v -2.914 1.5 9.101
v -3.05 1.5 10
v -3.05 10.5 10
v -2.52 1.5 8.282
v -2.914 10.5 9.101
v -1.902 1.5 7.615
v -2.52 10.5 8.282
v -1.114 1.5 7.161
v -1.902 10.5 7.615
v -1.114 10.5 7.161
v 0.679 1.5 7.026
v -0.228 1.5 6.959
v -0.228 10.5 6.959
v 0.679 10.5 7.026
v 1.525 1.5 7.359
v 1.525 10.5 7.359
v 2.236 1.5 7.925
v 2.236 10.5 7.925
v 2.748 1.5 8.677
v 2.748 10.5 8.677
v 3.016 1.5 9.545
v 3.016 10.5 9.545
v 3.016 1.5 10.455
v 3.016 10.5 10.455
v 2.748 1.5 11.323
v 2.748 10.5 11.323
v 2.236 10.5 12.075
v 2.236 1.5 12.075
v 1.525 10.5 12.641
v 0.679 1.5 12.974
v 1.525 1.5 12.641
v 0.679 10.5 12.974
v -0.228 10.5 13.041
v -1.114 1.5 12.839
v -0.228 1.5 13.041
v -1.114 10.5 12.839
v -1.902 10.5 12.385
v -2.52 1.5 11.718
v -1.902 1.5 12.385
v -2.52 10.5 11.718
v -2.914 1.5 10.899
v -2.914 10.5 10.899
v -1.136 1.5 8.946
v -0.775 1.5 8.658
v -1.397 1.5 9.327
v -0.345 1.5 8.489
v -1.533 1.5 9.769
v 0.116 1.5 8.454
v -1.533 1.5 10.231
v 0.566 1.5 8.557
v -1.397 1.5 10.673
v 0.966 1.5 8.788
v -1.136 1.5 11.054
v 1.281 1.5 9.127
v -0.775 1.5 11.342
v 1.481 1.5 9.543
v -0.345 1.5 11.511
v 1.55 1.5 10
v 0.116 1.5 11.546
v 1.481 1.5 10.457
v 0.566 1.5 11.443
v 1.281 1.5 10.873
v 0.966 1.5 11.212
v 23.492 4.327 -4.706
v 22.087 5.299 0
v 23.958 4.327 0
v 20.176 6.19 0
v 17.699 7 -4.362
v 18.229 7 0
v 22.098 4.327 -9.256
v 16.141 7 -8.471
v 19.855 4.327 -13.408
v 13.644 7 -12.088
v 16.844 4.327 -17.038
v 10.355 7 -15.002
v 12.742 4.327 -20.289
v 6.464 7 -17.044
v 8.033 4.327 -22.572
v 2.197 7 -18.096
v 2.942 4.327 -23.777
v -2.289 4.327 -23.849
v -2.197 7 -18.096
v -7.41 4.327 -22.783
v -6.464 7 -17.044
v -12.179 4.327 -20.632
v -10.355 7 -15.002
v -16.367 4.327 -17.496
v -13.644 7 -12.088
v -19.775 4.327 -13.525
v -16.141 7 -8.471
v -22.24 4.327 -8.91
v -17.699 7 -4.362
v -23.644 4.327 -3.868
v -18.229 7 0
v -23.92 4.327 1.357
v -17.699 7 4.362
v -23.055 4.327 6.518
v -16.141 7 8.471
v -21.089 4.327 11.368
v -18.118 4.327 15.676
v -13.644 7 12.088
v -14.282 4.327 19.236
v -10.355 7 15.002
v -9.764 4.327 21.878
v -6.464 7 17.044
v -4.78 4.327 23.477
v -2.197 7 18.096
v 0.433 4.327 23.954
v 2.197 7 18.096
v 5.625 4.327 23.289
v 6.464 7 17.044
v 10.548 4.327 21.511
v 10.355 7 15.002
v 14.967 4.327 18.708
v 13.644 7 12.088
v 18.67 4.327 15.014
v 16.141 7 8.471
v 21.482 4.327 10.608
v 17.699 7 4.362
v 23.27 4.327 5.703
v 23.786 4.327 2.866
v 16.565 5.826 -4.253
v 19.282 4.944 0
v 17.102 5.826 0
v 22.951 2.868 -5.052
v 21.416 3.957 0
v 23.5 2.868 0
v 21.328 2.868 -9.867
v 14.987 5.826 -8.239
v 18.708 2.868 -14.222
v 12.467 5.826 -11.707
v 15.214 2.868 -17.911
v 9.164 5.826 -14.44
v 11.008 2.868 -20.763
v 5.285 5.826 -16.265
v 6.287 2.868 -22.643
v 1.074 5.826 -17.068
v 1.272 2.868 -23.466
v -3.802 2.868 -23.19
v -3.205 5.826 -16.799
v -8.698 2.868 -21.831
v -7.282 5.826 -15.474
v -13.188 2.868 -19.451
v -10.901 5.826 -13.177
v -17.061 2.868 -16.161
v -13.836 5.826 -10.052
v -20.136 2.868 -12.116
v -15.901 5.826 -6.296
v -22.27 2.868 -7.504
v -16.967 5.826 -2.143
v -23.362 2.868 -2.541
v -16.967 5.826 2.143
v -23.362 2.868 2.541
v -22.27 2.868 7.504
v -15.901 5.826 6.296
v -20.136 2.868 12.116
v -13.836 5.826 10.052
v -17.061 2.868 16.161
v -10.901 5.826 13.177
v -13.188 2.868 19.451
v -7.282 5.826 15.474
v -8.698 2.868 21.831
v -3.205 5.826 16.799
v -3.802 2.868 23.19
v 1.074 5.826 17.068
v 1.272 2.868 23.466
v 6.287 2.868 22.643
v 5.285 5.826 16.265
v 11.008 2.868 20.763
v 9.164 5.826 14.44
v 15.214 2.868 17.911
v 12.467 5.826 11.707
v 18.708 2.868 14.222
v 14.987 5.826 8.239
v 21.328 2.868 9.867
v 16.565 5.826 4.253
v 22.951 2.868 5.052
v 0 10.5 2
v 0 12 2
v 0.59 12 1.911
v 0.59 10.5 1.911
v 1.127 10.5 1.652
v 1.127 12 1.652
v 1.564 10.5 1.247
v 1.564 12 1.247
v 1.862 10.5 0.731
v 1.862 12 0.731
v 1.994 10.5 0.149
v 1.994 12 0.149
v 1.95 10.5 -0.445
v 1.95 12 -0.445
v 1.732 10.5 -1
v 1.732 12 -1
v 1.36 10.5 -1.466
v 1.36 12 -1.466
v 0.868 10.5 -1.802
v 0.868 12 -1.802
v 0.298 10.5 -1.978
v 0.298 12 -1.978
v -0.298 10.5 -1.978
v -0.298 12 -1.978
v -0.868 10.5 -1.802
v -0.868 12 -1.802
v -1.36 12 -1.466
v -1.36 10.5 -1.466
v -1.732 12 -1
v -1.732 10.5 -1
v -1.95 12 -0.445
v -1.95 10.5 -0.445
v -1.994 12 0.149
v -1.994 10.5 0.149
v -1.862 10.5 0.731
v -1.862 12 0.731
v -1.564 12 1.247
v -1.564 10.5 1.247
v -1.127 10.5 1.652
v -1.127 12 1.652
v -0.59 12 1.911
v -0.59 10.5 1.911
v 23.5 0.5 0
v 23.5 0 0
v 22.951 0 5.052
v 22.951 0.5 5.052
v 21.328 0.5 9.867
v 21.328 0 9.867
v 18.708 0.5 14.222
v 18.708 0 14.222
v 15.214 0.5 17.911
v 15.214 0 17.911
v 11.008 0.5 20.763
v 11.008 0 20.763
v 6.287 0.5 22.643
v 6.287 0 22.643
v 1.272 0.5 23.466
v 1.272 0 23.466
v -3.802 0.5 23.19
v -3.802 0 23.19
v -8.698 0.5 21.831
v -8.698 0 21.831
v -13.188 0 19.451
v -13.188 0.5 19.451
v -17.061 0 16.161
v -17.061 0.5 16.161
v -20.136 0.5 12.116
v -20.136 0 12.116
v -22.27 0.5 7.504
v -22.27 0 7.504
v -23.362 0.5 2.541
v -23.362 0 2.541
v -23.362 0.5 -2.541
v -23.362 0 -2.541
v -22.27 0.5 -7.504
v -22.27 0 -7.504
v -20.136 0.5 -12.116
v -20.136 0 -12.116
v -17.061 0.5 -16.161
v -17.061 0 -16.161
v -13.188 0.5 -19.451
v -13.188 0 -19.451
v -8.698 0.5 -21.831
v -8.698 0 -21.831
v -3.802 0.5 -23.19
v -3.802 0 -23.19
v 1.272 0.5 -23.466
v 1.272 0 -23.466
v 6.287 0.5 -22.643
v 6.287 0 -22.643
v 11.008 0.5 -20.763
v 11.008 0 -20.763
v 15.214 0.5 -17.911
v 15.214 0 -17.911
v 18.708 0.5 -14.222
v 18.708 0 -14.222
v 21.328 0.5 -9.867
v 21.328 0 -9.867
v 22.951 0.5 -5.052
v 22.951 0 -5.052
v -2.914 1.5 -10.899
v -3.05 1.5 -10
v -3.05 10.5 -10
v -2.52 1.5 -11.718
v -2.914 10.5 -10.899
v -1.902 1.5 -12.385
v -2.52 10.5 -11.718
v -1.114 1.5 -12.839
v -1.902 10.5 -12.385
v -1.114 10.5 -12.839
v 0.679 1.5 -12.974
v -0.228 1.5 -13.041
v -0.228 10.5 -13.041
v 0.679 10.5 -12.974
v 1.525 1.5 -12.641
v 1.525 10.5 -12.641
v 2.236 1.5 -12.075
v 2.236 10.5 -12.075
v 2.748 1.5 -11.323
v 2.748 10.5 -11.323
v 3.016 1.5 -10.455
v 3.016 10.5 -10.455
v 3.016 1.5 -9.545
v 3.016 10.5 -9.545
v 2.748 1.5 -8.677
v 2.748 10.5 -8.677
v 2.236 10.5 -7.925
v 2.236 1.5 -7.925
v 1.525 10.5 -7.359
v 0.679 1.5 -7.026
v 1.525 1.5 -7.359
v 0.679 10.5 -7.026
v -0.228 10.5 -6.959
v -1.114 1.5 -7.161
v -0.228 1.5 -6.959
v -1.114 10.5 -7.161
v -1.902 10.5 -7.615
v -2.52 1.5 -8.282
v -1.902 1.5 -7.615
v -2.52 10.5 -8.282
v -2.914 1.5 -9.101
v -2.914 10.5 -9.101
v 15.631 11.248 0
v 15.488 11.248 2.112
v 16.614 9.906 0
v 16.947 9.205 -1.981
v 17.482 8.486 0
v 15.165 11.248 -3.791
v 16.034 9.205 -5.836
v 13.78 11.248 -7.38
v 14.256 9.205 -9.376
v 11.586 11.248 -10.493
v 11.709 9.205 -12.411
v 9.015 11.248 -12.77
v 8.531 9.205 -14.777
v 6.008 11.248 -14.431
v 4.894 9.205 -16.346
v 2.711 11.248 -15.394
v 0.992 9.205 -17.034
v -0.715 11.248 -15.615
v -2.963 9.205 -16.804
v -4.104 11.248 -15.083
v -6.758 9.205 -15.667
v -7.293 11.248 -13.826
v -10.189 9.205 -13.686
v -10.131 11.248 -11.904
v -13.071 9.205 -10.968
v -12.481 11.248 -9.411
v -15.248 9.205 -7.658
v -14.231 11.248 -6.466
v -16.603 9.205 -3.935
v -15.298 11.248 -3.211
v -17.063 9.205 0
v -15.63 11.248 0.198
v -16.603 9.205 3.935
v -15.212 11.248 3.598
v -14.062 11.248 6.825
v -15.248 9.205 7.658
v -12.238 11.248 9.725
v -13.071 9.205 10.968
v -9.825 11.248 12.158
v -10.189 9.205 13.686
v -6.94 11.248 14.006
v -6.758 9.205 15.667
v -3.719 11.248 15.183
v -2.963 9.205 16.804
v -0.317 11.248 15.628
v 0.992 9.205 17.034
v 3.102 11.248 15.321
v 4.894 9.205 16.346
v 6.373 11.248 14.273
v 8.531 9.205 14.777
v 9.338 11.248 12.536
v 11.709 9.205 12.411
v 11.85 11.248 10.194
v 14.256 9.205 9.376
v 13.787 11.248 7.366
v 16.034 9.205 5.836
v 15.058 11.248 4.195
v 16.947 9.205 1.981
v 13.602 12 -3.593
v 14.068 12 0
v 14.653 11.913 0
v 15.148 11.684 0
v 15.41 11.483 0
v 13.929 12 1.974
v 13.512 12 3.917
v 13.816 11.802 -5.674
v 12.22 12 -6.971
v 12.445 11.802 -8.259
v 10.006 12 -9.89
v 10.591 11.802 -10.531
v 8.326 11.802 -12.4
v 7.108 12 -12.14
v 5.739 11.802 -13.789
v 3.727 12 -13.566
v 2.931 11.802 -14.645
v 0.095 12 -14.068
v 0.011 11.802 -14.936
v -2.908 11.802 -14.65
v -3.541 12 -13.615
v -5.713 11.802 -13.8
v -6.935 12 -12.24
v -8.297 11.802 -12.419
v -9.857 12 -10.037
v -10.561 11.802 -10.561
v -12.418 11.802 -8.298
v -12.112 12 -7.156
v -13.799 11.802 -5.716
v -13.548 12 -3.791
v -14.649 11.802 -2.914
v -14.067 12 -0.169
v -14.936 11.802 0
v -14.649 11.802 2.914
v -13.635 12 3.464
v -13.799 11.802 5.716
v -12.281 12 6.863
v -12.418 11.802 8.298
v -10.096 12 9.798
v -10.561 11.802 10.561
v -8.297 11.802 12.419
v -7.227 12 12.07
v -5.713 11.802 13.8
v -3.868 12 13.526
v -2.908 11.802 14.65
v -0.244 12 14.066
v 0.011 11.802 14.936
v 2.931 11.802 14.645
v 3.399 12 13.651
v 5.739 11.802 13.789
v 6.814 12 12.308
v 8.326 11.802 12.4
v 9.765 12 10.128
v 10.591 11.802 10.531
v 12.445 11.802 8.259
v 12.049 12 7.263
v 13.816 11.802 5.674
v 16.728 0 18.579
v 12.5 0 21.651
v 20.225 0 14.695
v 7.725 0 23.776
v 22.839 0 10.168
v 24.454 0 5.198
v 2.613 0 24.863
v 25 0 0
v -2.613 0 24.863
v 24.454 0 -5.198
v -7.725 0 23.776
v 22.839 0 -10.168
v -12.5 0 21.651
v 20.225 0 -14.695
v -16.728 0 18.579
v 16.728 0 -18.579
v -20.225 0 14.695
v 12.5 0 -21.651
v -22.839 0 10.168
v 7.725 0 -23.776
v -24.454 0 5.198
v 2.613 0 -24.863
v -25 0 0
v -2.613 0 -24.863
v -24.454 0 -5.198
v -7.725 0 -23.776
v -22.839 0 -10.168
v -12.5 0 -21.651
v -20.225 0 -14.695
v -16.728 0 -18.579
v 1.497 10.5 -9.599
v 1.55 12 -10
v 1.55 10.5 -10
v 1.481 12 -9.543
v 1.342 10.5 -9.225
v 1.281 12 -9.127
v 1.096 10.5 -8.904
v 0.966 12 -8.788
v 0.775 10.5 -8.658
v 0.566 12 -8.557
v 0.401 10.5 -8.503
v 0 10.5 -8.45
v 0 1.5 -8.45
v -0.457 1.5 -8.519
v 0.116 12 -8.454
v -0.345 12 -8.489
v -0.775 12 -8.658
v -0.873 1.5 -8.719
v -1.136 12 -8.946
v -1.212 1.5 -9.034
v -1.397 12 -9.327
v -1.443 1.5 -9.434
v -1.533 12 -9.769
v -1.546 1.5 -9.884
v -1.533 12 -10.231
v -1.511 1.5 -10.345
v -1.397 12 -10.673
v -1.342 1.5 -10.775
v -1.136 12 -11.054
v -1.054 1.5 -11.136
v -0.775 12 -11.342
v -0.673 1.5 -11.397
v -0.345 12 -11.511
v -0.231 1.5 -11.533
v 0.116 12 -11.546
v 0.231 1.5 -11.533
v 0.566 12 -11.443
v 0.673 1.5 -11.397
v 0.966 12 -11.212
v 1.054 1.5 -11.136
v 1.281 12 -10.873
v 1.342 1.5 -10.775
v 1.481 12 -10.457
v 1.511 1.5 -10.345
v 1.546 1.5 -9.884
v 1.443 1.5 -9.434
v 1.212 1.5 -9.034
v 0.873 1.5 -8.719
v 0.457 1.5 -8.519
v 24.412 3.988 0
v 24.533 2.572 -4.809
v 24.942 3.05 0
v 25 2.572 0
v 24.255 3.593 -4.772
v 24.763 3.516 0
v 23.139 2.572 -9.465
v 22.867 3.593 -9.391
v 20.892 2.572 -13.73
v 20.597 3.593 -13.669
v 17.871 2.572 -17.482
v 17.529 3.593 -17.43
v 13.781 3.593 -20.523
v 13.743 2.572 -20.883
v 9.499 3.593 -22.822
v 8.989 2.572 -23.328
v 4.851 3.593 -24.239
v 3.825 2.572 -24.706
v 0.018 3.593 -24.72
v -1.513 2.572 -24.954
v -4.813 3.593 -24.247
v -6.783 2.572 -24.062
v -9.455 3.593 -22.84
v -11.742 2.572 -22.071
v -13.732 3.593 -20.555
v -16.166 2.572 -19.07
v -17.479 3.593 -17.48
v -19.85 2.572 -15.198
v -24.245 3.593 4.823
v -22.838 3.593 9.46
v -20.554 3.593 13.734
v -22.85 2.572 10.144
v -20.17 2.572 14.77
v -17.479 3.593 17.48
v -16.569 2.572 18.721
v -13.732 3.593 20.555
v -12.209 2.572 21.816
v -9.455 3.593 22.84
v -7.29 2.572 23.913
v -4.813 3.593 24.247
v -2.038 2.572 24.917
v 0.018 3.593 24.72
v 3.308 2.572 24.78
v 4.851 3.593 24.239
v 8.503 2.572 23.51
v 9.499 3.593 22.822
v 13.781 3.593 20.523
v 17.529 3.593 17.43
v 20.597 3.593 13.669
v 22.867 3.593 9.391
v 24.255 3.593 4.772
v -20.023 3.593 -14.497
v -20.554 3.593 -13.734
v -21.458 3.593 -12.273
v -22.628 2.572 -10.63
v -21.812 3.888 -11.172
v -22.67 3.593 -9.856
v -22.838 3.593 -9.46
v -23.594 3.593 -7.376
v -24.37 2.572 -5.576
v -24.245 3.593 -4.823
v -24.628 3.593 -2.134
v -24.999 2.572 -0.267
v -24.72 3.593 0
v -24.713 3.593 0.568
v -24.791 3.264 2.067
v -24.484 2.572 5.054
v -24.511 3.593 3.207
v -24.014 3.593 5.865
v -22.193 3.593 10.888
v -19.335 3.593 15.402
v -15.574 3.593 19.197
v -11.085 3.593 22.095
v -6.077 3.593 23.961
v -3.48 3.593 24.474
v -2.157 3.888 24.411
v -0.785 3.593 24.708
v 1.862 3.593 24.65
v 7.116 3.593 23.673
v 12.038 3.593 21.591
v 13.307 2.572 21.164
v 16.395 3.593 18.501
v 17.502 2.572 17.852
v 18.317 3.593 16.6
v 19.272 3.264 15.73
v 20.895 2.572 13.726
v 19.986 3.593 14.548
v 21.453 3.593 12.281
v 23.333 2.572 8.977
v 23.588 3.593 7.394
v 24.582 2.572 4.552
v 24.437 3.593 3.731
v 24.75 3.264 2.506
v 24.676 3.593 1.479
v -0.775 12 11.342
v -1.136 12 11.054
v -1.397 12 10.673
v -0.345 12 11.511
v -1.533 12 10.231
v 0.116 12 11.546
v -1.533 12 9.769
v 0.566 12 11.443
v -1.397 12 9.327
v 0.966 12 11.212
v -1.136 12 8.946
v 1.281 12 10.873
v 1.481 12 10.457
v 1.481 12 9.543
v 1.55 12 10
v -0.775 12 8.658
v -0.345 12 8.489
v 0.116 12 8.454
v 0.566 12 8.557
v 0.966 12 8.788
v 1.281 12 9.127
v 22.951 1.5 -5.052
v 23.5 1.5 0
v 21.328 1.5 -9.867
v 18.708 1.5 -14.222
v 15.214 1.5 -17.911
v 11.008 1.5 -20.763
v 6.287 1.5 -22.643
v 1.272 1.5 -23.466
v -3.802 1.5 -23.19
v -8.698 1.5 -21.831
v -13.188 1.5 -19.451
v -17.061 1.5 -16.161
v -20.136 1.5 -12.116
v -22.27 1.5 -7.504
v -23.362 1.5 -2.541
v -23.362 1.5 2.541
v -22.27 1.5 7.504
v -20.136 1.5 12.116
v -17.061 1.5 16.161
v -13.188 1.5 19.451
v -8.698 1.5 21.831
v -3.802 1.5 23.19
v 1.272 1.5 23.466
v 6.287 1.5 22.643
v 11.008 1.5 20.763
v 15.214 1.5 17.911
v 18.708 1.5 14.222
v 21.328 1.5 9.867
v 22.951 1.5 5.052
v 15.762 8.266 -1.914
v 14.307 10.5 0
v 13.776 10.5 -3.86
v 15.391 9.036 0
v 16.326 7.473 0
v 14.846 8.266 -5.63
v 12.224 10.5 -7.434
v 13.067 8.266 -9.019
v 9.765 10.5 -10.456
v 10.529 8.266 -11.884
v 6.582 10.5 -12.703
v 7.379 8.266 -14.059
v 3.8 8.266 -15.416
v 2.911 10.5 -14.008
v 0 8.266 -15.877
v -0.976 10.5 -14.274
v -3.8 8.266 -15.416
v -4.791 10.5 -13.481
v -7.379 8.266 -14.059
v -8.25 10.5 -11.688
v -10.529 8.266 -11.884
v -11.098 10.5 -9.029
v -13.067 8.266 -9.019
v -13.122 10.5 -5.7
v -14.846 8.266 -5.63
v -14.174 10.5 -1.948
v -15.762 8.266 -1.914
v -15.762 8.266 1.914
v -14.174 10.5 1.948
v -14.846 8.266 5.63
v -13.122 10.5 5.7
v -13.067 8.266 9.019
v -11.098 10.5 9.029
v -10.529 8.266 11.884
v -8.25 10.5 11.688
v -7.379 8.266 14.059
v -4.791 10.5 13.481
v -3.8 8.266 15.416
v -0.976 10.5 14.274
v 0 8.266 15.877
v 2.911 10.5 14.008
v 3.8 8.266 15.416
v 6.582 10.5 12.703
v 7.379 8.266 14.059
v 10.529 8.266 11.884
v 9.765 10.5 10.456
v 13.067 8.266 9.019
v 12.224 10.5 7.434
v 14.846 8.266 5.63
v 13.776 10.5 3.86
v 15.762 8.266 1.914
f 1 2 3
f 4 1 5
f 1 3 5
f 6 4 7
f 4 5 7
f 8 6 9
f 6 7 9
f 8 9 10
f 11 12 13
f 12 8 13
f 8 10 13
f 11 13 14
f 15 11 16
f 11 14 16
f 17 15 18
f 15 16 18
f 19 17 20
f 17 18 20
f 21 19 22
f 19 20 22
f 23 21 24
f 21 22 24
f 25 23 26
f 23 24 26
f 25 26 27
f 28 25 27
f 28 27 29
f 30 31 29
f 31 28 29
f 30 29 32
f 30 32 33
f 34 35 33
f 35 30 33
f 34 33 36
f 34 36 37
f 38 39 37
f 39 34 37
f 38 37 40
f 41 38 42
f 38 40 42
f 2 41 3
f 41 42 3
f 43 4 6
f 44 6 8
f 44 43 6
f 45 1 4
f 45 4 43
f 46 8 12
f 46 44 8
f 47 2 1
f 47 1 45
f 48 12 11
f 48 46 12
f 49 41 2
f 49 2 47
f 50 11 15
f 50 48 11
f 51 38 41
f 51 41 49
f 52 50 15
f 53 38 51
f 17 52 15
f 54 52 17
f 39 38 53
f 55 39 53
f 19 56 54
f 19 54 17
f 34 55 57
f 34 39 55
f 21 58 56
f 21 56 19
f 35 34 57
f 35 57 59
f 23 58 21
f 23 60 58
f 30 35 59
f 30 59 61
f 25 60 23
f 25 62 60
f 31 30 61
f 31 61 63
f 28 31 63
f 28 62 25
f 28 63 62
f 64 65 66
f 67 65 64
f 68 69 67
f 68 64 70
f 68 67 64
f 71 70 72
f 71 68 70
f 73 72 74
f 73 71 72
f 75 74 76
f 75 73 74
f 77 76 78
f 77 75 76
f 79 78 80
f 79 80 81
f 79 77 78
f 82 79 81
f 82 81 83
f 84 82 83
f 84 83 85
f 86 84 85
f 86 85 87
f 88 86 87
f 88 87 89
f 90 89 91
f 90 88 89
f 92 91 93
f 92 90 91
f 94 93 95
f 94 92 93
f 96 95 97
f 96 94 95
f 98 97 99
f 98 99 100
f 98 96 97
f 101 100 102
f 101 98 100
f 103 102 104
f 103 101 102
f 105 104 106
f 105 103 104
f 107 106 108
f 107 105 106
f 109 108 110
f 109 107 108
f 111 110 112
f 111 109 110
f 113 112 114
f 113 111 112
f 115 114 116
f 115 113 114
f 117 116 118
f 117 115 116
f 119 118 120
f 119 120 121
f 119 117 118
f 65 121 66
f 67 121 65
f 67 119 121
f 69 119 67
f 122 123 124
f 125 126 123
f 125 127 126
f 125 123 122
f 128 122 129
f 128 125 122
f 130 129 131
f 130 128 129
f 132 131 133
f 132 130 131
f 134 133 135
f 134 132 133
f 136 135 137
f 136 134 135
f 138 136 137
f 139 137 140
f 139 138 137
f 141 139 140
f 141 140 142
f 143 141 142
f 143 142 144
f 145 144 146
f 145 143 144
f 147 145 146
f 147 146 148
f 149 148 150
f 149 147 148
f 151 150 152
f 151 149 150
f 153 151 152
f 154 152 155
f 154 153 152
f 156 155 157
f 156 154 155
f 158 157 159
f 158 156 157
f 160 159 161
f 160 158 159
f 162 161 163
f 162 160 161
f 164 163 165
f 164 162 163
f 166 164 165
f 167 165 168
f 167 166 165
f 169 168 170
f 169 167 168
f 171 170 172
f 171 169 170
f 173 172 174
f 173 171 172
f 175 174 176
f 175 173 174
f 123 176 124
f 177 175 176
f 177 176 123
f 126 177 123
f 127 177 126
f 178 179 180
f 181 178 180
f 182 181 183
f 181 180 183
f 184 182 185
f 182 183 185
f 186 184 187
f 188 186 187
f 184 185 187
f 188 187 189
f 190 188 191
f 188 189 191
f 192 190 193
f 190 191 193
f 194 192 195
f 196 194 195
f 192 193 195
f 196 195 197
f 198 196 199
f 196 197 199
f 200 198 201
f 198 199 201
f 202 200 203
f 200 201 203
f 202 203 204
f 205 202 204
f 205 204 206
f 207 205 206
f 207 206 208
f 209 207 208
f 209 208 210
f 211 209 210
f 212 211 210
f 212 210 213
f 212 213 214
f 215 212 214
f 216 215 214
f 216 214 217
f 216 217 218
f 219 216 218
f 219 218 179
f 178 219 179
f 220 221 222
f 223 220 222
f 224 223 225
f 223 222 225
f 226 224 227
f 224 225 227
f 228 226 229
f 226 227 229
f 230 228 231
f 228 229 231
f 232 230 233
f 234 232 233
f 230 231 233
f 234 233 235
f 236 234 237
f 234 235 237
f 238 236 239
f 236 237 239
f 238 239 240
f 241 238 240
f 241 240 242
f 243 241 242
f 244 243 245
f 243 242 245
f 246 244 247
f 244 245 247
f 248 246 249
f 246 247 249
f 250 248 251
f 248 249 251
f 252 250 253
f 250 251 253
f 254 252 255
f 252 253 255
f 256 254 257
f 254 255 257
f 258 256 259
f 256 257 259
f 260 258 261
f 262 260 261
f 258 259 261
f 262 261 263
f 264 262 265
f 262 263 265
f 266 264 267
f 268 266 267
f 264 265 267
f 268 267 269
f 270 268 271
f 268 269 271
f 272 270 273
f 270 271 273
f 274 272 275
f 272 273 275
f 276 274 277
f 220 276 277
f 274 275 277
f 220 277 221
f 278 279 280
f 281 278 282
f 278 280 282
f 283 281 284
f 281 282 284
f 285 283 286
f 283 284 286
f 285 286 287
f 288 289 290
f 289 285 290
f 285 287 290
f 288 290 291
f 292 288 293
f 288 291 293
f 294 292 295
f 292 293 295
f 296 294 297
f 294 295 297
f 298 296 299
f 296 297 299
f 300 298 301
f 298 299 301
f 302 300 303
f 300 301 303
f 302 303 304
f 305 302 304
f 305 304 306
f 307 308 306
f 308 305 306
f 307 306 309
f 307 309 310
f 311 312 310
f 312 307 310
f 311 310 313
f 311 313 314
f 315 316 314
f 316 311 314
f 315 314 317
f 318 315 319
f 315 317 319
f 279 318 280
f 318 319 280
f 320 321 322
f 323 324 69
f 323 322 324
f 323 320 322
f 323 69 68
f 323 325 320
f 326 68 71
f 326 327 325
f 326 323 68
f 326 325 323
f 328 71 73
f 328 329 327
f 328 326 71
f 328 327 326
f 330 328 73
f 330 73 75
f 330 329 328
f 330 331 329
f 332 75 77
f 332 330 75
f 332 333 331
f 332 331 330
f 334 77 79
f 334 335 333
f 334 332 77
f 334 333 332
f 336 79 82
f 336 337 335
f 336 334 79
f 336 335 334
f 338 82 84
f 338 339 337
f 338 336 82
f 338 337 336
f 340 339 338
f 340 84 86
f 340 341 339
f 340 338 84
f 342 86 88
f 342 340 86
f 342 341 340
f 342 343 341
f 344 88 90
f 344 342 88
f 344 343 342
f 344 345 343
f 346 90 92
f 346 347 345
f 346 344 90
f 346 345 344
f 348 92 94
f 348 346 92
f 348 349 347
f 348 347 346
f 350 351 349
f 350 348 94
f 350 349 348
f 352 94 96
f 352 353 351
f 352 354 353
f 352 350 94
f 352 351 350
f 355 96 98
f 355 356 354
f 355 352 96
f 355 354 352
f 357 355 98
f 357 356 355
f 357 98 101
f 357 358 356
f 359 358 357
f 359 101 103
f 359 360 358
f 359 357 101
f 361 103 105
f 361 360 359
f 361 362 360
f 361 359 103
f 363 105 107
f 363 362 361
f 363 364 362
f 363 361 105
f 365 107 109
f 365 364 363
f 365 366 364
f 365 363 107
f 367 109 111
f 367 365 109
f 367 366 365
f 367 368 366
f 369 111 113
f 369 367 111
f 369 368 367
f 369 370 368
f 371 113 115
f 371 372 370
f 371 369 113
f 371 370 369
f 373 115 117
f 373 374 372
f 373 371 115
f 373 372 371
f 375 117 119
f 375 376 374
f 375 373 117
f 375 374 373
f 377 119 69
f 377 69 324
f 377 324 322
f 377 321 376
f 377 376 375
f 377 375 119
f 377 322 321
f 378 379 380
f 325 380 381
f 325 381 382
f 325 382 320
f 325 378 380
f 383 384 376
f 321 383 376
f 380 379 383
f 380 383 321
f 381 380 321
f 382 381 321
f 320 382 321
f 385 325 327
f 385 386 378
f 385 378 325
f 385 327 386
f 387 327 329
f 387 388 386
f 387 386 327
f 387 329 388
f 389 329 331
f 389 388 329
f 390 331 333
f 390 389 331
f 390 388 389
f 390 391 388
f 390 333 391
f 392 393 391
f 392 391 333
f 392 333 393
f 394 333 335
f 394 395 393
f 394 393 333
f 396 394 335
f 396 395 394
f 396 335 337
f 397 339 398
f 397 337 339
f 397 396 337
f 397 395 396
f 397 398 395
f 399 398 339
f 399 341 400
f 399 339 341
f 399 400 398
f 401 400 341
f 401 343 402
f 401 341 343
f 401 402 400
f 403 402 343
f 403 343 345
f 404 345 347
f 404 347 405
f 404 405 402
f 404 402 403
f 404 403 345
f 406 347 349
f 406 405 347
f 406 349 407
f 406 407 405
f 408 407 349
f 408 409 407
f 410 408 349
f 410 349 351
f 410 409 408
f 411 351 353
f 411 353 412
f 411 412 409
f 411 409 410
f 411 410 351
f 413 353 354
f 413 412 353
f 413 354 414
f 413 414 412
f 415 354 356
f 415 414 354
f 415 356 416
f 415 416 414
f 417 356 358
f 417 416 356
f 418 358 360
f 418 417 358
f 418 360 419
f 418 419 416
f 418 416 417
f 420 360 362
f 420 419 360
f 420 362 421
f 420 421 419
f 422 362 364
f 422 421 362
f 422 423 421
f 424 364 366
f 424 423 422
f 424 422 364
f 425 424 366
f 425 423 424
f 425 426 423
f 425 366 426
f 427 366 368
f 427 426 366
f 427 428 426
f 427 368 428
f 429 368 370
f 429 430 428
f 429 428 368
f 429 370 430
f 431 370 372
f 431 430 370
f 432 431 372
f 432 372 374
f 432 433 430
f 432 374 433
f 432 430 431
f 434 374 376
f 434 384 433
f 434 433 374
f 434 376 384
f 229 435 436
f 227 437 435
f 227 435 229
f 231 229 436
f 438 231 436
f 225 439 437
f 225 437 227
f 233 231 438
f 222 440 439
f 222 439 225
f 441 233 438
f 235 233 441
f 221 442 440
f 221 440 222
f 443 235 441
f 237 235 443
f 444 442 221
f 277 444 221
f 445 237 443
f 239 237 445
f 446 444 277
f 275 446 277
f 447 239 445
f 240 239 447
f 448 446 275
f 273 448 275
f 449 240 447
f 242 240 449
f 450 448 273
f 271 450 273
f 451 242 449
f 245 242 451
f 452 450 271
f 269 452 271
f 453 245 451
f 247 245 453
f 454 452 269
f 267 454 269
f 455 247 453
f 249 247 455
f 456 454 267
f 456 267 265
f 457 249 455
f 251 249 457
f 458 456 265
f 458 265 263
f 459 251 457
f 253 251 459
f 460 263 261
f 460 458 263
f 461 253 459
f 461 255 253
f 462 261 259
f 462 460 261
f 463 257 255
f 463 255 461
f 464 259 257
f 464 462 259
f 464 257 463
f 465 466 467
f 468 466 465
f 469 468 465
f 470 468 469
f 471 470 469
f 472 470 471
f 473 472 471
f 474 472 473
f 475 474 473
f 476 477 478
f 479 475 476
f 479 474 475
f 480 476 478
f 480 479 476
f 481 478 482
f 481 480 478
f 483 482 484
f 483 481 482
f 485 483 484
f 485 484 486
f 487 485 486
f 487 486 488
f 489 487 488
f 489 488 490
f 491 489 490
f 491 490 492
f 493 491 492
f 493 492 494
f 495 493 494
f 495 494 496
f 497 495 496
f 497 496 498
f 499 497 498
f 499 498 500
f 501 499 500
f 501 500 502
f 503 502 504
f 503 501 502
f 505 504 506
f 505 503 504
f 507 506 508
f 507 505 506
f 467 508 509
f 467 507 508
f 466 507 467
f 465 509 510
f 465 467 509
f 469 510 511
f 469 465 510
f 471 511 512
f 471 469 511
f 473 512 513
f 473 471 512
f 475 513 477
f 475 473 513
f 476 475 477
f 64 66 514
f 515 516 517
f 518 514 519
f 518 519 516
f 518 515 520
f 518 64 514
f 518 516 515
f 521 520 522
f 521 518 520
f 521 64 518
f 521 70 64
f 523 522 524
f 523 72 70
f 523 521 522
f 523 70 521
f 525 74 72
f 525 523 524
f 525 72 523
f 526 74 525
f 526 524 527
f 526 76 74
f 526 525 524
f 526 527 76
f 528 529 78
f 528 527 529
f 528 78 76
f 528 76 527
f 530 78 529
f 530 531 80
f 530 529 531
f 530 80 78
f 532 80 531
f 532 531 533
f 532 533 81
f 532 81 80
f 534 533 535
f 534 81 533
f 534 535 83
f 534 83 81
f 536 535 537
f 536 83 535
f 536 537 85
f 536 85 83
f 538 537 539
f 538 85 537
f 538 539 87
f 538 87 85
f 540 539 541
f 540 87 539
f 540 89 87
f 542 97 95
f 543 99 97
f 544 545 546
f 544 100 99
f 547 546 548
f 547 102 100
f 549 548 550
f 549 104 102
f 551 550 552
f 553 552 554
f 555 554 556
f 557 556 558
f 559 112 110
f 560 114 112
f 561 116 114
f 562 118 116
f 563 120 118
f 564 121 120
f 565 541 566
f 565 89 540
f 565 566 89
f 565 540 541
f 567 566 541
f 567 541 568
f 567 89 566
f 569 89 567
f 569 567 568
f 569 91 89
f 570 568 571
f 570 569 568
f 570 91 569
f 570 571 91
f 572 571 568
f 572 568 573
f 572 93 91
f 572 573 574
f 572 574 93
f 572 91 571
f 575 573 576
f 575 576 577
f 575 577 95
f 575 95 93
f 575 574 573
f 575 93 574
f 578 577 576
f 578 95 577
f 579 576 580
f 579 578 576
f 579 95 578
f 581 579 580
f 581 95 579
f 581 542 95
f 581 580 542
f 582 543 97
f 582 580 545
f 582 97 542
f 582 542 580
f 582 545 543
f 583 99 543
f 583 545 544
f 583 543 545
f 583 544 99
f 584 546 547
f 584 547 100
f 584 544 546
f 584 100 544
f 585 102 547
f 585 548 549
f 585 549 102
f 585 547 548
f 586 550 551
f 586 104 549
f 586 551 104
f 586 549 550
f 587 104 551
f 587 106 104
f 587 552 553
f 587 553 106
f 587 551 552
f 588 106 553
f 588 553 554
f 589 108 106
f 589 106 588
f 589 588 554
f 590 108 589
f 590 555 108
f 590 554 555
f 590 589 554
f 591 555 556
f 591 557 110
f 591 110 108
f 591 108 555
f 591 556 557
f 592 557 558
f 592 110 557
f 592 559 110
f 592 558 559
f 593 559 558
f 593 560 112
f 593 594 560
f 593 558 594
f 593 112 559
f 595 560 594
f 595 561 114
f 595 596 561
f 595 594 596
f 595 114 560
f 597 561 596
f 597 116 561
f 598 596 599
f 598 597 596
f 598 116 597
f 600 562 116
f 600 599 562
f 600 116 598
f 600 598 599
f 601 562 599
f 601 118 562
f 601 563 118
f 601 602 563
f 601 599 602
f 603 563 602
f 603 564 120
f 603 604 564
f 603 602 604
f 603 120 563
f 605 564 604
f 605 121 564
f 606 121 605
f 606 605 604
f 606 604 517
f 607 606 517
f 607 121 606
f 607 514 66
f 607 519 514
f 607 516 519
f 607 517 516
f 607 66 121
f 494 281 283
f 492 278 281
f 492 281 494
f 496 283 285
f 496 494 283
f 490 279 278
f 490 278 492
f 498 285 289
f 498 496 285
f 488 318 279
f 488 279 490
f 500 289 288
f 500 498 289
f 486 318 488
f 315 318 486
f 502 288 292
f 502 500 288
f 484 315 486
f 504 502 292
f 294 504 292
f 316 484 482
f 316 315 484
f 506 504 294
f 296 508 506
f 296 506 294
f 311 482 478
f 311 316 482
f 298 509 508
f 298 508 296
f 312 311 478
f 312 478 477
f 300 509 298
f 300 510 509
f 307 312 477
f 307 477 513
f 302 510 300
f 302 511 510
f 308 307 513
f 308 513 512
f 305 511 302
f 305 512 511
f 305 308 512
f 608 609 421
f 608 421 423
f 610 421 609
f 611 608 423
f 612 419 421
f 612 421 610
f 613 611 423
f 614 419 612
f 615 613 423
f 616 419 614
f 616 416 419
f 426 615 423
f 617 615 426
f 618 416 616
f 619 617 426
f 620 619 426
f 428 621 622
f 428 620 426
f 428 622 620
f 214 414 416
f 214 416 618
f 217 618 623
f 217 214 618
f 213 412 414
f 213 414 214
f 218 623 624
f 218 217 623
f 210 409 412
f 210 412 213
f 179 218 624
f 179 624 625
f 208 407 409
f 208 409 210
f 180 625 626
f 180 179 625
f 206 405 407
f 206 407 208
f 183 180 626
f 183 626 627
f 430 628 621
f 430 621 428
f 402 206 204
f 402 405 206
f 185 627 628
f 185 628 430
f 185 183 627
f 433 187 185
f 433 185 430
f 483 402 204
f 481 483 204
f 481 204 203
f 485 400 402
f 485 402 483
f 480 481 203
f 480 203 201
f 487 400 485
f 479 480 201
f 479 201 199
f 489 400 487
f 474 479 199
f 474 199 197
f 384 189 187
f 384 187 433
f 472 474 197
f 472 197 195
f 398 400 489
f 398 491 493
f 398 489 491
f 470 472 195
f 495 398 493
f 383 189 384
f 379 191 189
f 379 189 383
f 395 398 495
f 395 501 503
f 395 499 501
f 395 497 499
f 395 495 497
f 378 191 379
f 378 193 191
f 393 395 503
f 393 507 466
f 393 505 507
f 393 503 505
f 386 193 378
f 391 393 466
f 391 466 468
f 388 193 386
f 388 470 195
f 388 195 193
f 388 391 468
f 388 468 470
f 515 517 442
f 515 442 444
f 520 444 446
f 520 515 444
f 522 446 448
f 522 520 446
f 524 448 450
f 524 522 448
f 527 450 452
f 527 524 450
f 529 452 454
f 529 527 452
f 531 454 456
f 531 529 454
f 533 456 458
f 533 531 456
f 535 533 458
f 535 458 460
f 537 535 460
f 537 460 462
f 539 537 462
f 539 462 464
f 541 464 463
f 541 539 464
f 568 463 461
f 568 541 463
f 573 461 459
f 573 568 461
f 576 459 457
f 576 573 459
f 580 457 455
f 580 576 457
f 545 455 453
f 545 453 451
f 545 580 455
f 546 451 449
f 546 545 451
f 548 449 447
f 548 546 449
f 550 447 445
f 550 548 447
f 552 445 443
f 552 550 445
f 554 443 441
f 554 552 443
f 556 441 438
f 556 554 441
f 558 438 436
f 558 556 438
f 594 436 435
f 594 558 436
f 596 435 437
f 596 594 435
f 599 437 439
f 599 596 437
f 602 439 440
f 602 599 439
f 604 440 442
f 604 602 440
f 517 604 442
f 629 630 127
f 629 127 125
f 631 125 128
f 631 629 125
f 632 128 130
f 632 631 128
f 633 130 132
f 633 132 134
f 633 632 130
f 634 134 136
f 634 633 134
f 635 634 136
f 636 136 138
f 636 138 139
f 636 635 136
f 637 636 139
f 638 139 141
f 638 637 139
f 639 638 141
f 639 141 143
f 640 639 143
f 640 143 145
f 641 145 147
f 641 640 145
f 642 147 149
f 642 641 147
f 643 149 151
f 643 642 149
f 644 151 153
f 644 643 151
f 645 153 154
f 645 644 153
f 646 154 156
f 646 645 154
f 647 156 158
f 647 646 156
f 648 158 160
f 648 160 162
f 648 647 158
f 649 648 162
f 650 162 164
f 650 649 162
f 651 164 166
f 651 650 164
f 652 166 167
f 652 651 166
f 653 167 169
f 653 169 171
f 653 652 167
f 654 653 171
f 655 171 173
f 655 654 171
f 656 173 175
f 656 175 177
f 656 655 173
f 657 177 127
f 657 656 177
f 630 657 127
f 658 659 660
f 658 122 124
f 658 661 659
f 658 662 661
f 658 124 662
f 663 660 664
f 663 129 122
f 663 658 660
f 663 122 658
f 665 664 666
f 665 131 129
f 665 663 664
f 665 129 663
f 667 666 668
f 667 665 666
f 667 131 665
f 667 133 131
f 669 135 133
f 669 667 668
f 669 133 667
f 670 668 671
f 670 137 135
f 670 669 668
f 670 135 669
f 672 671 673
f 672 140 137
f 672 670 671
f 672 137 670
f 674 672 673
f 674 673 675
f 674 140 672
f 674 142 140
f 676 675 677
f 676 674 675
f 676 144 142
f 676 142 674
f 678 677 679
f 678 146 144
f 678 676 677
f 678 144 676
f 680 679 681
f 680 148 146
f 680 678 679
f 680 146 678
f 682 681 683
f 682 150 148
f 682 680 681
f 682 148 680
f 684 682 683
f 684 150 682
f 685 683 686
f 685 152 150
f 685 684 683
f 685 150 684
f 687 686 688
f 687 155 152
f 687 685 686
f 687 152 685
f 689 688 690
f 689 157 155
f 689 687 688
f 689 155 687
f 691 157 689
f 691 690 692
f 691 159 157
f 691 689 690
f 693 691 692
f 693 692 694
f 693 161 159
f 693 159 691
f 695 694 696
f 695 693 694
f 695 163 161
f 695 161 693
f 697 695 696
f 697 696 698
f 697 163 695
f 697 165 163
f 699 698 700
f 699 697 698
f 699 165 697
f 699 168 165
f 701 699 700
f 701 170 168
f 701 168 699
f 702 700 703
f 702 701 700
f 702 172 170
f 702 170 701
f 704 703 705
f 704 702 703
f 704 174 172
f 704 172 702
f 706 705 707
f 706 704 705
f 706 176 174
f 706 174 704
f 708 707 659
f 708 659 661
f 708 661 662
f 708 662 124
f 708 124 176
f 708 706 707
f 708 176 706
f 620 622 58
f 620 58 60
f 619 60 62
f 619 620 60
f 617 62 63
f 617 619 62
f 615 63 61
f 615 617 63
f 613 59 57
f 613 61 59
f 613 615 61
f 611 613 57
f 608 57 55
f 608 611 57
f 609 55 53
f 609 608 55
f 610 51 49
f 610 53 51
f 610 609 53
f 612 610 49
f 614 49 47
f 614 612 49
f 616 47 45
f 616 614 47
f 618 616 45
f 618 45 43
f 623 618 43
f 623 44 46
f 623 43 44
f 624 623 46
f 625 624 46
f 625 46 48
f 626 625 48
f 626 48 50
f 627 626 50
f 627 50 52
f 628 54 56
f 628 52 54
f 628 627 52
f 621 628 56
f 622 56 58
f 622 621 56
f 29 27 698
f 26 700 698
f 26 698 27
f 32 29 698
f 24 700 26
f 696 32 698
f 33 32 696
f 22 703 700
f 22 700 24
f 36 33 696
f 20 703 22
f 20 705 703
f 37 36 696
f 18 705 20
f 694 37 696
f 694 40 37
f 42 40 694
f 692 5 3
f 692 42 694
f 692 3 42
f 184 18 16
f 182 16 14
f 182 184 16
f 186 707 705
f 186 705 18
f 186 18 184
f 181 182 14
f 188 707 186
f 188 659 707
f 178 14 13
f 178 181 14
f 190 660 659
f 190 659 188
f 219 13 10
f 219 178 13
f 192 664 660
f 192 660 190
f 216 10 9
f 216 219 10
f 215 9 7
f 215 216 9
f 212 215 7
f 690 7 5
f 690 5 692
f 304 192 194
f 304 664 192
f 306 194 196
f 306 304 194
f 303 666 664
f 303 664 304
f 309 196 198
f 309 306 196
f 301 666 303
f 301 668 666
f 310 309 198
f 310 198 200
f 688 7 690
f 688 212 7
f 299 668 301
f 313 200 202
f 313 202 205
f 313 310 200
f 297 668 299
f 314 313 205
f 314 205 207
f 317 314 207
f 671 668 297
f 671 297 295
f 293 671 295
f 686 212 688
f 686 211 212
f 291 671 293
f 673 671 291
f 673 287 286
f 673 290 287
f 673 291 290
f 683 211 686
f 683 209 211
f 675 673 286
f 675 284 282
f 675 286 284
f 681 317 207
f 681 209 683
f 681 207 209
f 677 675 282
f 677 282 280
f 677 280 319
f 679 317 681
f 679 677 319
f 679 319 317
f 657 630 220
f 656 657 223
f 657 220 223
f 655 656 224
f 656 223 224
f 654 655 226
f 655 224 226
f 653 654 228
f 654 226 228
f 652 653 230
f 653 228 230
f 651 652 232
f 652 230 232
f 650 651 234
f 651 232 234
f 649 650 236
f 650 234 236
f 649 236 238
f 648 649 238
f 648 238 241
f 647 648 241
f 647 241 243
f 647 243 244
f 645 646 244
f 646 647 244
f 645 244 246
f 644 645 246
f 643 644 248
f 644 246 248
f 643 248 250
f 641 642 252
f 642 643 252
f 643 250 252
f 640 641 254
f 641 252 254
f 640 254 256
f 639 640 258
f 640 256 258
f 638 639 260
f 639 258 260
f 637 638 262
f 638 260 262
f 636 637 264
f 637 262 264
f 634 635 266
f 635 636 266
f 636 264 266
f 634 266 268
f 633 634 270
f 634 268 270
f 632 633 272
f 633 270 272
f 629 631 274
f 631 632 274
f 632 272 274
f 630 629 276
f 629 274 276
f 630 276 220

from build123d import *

# Parameters (mm, degrees)
CROQUIS5_R              = 2
CORTAR_EXTRUIR1_DEPTH   = 6
CROQUIS6_R              = 23.5
CORTAR_EXTRUIR2_DEPTH   = 0.5
CROQUIS7_R              = 3.05
CROQUIS7_R_2            = 1.55
SALIENTE_EXTRUIR1_DEPTH = 9.5
CORTAR_EXTRUIR3_START   = -5.5
CROQUIS8_R              = 1.55
CORTAR_EXTRUIR3_DEPTH   = 5.5
REDONDEO1_R             = 2
REDONDEO2_R             = 2
CROQUIS9_R              = 23.5
CORTAR_EXTRUIR4_DEPTH   = 1


with BuildPart() as part:
    # Croquis3 → Revolución1 (revolve)
    with BuildSketch(Plane.XY):
        with BuildLine():
            Line((25, 0), (25, 3.742571384))
            ThreePointArc((25, 3.742571384), (21.675655898, 5.498663982), (18.228756555, 7))
            ThreePointArc((18.228756555, 7), (16.801415582, 9.620779584), (15, 12))
            Line((15, 12), (0, 12))
            Line((0, 12), (0, 0))
            Line((0, 0), (25, 0))
        make_face()
    revolve(axis=Axis((0, 0, 0), (0, 1, 0)))

    # Croquis4 → Cortar-Revolución1 (revolve, cut)
    with BuildSketch(Plane.XY):
        with BuildLine():
            Line((0, 1.5), (0, 10.5))
            Line((0, 10.5), (14.30686093, 10.5))
            ThreePointArc((14.30686093, 10.5), (15.877398251, 8.266411941), (17.102065618, 5.825983099))
            ThreePointArc((17.102065618, 5.825983099), (20.35484662, 4.463230038), (23.5, 2.867708066))
            Line((23.5, 2.867708066), (23.5, 1.5))
            Line((23.5, 1.5), (0, 1.5))
        make_face()
    revolve(axis=Axis((0, 10.5, 0), (0, 1, 0)), mode=Mode.SUBTRACT)

    # Croquis5 → Cortar-Extruir1 (cut)
    with BuildSketch(Plane(origin=(0, 12, 0), x_dir=(1, 0, 0), z_dir=(0, 1, 0))):
        with Locations(Location((0, 0, 0), (0, 0, 270))):
            Circle(CROQUIS5_R)
    extrude(amount=-CORTAR_EXTRUIR1_DEPTH, mode=Mode.SUBTRACT)

    # Croquis6 → Cortar-Extruir2 (cut)
    with BuildSketch(Plane.XZ):
        Circle(CROQUIS6_R)
    extrude(amount=-CORTAR_EXTRUIR2_DEPTH, mode=Mode.SUBTRACT)

    # Croquis7 → Saliente-Extruir1 (add)
    # profile 1 of 2: a face of its own
    with BuildSketch(Plane.XZ.offset(-10.5)):
        with Locations(Location((0, 10, 0), (0, 0, 180))):
            Circle(CROQUIS7_R)
        with Locations((0, 10)):
            Circle(CROQUIS7_R_2, mode=Mode.SUBTRACT)
    # profile 2 of 2: a face of its own
    with BuildSketch(Plane.XZ.offset(-10.5)):
        with Locations(Location((0, -10, 0), (0, 0, 180))):
            Circle(CROQUIS7_R)
        with Locations(Location((0, -10, 0), (0, 0, 90))):
            Circle(CROQUIS7_R_2, mode=Mode.SUBTRACT)
    extrude(amount=SALIENTE_EXTRUIR1_DEPTH)

    # Croquis8 → Cortar-Extruir3 (cut)
    with BuildSketch(Plane.XZ.offset(-10.5).offset(CORTAR_EXTRUIR3_START)):
        with Locations((0, -10)):
            Circle(CROQUIS8_R)
        with Locations((0, 10)):
            Circle(CROQUIS8_R)
    extrude(amount=CORTAR_EXTRUIR3_DEPTH, mode=Mode.SUBTRACT)

    # Redondeo1
    redondeo1_edges = [part.edges().sort_by_distance(p)[0] for p in [
        (-15, 12, 0),
    ]]
    fillet(redondeo1_edges, radius=REDONDEO1_R)

    # Redondeo2
    redondeo2_edges = [part.edges().sort_by_distance(p)[0] for p in [
        (-25, 3.742571384, 0),
    ]]
    fillet(redondeo2_edges, radius=REDONDEO2_R)

    # Croquis9 → Cortar-Extruir4 (cut)
    with BuildSketch(Plane.XZ.offset(-0.5)):
        Circle(CROQUIS9_R)
    extrude(amount=-CORTAR_EXTRUIR4_DEPTH, mode=Mode.SUBTRACT)


solid = part.part
